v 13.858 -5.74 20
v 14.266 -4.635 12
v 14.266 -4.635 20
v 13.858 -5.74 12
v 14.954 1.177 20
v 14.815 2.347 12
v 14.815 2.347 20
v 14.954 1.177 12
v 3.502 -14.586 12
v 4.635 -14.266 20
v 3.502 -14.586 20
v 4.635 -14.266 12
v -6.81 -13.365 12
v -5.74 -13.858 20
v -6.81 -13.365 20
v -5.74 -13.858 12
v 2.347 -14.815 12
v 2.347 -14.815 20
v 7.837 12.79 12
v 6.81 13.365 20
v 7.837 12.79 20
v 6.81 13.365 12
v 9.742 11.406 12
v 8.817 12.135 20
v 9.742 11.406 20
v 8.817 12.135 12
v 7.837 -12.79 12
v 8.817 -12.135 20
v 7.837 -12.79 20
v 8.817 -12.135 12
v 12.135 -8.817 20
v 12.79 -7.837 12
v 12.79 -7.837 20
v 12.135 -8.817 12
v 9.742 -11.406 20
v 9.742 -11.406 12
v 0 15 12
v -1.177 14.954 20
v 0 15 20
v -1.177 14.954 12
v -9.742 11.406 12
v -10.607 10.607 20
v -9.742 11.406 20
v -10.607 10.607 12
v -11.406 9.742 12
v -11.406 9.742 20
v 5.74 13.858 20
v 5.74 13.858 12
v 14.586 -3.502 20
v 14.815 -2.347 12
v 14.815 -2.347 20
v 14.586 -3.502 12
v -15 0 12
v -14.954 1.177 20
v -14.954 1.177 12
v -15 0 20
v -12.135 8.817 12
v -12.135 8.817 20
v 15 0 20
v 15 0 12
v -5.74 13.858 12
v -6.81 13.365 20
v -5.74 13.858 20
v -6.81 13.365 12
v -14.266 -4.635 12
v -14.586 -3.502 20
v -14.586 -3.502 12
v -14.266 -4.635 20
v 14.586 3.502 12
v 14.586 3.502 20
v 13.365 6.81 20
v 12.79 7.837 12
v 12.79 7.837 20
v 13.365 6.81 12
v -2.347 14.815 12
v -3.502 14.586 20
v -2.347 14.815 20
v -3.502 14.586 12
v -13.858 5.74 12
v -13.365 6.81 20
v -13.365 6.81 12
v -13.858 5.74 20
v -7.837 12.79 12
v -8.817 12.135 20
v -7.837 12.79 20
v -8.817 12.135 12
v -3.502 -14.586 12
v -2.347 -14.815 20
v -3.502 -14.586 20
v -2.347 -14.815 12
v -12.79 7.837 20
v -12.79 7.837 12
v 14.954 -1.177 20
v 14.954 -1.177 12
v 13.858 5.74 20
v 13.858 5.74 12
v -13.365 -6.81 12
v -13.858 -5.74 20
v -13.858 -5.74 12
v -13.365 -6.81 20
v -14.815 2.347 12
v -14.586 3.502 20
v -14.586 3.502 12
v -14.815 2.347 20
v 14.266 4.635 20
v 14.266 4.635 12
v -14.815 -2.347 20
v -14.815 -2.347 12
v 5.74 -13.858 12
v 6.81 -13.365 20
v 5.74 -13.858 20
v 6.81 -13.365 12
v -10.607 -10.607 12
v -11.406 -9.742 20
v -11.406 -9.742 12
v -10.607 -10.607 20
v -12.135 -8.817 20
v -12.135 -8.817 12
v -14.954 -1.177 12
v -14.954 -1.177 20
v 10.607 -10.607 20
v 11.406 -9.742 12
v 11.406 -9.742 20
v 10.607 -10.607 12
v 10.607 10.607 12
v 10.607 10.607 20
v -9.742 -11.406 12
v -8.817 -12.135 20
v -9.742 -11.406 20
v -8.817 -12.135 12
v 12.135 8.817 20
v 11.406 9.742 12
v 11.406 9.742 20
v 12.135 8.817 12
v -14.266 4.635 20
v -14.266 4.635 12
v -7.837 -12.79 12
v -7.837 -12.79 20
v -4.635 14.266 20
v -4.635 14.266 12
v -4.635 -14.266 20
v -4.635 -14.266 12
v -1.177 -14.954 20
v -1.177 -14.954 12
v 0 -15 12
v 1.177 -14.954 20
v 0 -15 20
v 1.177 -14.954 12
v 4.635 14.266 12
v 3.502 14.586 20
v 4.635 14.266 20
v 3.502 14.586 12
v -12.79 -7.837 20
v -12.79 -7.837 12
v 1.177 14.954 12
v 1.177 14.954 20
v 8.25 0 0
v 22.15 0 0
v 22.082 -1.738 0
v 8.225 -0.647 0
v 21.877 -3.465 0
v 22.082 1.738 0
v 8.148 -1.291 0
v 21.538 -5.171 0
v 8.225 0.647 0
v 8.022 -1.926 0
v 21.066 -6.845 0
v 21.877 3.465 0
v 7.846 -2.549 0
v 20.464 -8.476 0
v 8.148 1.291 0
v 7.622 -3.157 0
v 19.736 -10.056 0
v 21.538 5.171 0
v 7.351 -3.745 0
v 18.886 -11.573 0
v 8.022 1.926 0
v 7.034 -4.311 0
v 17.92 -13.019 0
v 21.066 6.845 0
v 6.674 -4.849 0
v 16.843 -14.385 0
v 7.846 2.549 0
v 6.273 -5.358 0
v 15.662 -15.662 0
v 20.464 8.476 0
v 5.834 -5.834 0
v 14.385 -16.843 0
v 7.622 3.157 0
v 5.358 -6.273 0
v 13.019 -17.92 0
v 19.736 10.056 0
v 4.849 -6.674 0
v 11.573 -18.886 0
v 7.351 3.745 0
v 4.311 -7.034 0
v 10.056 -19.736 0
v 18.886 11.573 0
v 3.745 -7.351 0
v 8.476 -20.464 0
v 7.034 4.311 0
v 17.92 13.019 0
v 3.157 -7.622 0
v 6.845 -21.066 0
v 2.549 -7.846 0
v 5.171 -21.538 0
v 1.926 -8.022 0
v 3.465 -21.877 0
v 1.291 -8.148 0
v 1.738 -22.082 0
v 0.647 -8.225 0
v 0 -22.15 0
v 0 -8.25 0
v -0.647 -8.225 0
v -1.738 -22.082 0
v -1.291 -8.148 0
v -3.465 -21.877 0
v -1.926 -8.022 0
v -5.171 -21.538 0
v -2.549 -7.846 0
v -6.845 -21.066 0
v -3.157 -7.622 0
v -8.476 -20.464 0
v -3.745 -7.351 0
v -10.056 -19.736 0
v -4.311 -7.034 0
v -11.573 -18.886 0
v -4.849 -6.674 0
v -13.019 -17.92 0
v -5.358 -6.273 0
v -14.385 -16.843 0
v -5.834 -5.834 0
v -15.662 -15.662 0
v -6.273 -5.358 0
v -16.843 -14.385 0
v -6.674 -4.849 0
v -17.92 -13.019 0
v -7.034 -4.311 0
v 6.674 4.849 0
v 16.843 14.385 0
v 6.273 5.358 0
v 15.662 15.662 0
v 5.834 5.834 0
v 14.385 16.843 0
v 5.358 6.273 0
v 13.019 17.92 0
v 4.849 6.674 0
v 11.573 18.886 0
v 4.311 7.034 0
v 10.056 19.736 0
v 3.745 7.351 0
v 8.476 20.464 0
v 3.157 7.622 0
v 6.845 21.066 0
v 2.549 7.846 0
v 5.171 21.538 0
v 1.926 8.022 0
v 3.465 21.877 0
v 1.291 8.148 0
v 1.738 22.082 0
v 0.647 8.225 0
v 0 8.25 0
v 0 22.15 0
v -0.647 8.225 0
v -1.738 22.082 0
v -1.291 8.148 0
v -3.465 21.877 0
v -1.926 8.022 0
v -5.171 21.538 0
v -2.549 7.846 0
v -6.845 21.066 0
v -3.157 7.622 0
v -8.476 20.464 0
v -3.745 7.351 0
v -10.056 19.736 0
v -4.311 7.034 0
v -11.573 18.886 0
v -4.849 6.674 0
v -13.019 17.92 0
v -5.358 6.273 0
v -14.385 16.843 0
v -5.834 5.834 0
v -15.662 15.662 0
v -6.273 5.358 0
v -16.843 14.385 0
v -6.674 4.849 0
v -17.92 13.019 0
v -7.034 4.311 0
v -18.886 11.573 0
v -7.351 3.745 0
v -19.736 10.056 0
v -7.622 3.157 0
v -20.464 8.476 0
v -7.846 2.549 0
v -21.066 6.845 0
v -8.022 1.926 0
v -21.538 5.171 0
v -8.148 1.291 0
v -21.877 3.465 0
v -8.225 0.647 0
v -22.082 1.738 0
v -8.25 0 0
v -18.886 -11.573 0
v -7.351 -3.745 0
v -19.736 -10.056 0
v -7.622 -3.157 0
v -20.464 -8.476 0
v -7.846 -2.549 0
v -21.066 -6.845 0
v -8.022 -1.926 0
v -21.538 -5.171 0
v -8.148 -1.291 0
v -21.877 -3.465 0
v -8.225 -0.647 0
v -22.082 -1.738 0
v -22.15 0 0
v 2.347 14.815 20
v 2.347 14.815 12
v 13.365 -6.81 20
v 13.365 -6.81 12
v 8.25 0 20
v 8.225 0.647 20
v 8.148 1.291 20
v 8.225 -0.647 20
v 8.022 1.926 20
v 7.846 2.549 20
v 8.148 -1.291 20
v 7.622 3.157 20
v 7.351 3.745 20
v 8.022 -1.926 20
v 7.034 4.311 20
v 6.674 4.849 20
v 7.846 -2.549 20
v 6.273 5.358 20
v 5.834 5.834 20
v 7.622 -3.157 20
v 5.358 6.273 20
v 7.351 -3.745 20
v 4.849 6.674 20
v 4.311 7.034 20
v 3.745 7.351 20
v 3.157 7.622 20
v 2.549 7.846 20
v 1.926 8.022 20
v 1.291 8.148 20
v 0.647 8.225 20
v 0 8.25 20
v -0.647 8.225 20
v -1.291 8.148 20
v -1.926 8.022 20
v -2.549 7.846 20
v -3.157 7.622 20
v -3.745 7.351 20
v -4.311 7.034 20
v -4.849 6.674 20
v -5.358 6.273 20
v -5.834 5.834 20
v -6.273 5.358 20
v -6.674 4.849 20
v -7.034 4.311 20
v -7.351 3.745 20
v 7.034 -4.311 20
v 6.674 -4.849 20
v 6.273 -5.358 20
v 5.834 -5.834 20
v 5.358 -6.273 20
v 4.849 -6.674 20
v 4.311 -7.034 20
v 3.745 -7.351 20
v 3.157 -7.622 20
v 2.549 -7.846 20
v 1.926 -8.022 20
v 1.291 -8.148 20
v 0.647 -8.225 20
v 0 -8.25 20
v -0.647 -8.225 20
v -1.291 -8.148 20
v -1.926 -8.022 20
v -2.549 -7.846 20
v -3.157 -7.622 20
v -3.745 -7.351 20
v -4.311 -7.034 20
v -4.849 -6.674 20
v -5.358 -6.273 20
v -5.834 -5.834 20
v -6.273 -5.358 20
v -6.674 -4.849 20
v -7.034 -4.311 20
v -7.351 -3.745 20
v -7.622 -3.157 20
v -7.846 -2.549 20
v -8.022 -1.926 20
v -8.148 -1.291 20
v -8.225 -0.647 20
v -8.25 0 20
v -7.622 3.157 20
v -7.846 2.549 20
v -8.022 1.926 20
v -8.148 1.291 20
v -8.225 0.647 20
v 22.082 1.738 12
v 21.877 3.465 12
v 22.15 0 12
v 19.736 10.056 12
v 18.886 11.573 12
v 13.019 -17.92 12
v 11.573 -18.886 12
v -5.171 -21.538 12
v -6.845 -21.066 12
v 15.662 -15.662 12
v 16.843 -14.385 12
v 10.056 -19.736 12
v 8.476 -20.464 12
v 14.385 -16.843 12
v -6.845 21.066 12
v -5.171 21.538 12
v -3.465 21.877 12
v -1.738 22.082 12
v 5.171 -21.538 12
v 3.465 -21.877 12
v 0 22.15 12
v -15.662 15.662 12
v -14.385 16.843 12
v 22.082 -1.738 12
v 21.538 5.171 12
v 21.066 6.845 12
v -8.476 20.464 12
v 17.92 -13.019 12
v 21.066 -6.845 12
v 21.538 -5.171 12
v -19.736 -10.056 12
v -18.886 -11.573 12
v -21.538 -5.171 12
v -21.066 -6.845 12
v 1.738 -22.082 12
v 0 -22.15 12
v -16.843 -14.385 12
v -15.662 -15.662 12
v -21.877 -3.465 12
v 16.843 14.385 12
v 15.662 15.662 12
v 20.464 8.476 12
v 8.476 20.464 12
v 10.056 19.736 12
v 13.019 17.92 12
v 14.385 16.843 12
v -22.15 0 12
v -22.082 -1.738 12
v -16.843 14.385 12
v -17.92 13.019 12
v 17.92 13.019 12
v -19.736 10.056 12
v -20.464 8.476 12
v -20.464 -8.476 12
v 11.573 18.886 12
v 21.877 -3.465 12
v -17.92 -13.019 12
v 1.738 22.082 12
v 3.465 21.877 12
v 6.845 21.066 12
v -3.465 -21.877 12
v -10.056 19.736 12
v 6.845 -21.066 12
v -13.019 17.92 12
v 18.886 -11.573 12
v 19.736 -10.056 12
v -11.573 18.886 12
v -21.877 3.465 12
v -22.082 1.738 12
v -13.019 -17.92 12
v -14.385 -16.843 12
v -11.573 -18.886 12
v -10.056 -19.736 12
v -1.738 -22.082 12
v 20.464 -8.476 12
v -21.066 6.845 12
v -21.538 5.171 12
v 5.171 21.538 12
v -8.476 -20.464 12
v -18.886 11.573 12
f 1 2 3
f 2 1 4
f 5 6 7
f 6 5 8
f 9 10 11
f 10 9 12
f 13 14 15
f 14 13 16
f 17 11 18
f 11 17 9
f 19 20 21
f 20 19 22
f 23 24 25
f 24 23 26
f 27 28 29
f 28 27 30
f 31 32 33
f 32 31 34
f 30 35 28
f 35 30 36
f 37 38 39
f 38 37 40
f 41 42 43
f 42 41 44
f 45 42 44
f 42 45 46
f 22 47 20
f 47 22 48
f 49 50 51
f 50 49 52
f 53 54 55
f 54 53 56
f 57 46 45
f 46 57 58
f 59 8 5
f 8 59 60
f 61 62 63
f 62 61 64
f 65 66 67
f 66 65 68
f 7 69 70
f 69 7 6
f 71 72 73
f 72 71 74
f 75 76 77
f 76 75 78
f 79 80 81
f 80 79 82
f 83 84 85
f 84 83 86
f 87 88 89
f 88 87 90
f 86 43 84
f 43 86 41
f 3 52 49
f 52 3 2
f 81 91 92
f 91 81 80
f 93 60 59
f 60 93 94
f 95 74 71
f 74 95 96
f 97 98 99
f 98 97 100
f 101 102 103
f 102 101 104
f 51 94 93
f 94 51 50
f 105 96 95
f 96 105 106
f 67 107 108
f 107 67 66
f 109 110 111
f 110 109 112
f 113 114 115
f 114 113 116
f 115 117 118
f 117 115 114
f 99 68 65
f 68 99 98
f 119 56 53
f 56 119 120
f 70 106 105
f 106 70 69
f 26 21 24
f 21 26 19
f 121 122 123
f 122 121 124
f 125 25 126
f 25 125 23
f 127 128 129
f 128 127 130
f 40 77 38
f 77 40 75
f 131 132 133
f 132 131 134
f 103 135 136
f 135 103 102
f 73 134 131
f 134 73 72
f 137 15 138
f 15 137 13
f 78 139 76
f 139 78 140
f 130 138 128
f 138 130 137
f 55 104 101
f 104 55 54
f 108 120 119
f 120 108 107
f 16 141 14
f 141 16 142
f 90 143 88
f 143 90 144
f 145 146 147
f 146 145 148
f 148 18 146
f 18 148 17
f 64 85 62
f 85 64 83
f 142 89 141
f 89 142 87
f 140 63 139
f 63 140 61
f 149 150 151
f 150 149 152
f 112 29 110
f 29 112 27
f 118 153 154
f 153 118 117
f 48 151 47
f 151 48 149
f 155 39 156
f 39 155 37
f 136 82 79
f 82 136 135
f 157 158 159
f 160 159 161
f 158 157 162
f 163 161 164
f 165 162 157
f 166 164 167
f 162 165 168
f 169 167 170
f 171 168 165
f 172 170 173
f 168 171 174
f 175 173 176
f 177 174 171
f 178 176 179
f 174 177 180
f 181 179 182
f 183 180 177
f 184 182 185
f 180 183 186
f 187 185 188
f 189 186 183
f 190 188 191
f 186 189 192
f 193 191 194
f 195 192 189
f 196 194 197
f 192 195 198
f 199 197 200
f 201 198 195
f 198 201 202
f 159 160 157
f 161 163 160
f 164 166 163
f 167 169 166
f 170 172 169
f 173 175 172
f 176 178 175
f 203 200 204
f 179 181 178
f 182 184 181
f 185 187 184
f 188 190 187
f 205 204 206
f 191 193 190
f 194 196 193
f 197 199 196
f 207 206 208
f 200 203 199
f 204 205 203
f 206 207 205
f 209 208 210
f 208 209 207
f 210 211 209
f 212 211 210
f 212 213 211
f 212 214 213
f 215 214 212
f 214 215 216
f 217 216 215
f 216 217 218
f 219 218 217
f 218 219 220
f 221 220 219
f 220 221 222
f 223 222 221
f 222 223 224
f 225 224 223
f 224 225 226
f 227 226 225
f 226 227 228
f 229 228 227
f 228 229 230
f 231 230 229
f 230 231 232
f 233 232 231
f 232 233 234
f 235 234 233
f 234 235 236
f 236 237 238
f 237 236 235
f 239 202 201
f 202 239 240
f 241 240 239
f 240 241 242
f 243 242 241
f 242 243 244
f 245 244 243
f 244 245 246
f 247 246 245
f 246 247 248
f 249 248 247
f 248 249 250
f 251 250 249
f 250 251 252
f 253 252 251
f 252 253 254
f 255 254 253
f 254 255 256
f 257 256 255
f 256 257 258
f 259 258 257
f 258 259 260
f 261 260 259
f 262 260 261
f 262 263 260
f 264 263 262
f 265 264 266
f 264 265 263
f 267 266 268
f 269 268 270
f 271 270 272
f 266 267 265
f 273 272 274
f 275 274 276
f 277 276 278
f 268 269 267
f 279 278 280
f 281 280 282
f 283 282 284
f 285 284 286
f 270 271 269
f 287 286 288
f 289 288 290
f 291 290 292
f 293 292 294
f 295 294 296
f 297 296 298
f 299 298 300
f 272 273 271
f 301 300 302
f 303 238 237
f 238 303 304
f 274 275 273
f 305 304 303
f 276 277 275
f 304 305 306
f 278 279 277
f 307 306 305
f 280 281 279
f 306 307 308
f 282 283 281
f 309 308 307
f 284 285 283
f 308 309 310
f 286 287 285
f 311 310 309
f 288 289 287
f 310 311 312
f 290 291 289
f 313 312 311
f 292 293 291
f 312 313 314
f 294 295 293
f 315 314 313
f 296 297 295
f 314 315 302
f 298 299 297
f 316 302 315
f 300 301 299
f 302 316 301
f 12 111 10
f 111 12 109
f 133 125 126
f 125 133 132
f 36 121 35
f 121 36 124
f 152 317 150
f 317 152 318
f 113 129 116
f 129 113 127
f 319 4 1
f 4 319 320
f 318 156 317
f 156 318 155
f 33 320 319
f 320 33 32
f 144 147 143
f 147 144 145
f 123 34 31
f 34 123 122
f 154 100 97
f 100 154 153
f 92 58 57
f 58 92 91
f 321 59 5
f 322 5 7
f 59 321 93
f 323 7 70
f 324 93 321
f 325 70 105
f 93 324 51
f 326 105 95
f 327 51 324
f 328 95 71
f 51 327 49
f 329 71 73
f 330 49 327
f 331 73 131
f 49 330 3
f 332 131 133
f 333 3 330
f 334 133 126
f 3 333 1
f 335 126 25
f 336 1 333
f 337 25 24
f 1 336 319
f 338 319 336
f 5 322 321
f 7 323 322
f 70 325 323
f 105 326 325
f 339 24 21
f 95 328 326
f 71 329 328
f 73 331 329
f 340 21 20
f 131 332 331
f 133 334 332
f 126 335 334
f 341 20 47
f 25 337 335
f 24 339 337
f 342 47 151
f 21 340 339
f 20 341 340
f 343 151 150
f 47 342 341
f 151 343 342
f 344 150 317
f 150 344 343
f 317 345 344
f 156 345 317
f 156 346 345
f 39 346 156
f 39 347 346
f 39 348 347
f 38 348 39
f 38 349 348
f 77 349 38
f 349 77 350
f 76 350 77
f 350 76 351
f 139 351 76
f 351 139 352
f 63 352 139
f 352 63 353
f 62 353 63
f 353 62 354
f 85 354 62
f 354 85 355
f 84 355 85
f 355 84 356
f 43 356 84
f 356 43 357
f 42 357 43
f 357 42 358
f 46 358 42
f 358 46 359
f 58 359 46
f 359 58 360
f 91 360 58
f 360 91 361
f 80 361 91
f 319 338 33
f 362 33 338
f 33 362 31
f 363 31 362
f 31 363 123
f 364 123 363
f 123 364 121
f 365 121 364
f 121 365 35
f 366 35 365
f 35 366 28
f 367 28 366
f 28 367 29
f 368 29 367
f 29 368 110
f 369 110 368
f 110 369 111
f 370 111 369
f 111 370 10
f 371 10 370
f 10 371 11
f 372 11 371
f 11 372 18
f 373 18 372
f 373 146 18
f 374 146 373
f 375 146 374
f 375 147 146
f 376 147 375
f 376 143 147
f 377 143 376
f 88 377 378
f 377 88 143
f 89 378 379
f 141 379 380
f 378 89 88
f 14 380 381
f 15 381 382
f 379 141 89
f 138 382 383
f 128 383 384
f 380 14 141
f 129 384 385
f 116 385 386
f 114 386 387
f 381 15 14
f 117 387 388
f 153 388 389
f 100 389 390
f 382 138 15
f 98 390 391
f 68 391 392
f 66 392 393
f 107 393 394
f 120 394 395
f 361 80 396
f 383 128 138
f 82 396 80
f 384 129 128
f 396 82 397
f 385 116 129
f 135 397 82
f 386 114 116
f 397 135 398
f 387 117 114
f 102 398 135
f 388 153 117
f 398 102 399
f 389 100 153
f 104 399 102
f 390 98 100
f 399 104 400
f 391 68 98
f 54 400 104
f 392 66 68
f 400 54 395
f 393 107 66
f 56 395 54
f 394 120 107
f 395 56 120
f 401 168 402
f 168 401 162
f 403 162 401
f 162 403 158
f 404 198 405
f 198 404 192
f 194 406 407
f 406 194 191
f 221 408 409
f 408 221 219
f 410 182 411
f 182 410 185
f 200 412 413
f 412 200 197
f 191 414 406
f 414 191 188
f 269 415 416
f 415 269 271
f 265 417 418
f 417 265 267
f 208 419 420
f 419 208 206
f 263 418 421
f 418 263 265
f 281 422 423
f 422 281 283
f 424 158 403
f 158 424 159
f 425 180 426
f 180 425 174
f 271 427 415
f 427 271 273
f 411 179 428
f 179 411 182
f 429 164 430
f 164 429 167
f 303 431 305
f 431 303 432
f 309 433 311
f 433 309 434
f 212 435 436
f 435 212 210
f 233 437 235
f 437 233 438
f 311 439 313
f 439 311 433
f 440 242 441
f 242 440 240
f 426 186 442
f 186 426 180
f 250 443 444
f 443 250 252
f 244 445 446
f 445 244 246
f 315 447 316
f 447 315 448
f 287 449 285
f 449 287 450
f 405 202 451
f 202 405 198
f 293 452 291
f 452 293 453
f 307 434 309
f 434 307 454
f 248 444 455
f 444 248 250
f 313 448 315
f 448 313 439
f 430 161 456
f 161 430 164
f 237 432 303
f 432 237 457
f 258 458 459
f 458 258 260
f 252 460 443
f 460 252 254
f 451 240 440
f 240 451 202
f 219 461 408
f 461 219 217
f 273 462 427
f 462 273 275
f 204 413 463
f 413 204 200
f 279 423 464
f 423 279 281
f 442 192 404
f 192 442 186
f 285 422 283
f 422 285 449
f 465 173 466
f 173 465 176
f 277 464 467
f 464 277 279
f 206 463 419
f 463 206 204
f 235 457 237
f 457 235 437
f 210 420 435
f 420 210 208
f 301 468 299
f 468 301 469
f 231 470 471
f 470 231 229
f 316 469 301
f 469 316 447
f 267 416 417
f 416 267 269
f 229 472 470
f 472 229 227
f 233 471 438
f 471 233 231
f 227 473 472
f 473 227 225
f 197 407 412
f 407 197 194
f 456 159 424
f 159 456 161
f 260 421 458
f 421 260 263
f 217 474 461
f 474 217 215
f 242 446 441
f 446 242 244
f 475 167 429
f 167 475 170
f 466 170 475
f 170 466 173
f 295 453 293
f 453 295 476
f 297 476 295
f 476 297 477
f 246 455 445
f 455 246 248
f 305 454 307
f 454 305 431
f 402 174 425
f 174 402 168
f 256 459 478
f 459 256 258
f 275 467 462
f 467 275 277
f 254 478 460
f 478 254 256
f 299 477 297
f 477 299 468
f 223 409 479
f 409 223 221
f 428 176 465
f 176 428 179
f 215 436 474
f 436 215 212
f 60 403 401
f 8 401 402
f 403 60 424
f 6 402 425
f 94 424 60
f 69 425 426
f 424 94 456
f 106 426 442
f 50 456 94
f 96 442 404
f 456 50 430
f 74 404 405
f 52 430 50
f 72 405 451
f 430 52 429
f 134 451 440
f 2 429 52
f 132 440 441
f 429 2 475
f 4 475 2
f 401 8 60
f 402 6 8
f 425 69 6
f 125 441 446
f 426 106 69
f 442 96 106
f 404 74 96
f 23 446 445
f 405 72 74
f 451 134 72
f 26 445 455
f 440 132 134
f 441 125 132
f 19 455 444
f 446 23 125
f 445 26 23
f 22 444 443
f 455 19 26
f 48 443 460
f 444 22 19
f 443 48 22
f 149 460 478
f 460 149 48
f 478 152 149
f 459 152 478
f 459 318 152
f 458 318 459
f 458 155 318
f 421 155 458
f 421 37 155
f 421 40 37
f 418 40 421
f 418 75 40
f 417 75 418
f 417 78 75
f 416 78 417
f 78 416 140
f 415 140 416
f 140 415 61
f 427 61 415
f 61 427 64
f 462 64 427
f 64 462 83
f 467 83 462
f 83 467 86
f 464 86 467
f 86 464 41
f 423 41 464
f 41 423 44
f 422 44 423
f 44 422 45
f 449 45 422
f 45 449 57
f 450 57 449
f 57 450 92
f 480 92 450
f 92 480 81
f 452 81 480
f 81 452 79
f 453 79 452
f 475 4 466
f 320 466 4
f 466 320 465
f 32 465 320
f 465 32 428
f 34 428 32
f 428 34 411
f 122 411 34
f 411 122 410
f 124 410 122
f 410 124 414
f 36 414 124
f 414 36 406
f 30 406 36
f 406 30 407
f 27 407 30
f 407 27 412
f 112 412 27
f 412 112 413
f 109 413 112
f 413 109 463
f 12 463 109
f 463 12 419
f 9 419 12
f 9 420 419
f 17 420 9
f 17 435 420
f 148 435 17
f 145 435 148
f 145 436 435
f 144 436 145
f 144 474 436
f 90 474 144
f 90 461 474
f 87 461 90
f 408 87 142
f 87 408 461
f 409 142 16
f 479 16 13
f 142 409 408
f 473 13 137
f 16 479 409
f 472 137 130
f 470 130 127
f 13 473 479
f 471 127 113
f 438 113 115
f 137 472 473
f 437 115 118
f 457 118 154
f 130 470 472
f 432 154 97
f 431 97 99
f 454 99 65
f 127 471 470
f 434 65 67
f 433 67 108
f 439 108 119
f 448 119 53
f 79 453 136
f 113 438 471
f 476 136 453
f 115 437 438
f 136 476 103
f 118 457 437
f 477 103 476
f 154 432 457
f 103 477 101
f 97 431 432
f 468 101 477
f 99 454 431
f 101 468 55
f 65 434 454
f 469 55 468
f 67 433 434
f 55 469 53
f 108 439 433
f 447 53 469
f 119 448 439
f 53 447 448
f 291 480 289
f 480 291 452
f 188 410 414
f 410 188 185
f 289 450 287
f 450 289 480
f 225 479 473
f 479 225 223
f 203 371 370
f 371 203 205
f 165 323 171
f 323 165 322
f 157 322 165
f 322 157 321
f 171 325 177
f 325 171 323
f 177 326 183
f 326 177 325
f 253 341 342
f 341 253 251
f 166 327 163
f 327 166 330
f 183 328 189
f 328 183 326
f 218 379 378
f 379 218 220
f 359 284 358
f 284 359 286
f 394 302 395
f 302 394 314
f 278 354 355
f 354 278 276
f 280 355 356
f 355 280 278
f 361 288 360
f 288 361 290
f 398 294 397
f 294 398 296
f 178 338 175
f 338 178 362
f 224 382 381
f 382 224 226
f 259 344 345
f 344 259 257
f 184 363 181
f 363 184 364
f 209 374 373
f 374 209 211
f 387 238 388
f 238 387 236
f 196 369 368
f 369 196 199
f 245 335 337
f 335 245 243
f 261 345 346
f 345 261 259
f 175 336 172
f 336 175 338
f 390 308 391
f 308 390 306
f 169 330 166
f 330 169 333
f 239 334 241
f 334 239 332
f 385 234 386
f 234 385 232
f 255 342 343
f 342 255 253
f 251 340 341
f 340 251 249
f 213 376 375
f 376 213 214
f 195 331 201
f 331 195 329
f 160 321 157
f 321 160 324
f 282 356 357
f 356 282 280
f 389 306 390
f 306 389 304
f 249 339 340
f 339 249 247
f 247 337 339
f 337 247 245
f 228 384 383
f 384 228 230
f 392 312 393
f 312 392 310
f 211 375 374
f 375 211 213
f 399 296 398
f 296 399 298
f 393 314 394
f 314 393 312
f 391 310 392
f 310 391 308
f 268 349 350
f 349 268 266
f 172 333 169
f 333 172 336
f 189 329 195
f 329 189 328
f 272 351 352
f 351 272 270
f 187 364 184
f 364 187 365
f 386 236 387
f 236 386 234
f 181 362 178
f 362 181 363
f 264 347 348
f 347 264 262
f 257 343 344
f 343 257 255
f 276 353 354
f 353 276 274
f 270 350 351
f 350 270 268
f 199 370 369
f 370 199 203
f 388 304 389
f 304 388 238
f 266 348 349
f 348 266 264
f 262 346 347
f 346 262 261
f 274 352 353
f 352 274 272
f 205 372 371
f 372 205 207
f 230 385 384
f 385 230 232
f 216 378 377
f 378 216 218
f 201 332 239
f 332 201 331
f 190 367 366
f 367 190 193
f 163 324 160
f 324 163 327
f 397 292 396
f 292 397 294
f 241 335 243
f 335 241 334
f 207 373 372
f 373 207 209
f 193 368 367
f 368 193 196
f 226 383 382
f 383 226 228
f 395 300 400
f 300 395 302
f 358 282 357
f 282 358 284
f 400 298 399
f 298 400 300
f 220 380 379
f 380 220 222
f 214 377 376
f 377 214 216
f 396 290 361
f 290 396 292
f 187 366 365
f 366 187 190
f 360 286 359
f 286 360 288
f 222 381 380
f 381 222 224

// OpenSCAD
in=30;
out=44.3;
shaft=16.5;


difference() {
    union(){
        cylinder(r1=in/2, r2=in/2, h=20, $fn=80);
        cylinder(r1=out/2, r2=out/2, h=12, $fn=80);
    }
    cylinder(r1=shaft/2, r2=shaft/2, h=20, $fn=80);
}
